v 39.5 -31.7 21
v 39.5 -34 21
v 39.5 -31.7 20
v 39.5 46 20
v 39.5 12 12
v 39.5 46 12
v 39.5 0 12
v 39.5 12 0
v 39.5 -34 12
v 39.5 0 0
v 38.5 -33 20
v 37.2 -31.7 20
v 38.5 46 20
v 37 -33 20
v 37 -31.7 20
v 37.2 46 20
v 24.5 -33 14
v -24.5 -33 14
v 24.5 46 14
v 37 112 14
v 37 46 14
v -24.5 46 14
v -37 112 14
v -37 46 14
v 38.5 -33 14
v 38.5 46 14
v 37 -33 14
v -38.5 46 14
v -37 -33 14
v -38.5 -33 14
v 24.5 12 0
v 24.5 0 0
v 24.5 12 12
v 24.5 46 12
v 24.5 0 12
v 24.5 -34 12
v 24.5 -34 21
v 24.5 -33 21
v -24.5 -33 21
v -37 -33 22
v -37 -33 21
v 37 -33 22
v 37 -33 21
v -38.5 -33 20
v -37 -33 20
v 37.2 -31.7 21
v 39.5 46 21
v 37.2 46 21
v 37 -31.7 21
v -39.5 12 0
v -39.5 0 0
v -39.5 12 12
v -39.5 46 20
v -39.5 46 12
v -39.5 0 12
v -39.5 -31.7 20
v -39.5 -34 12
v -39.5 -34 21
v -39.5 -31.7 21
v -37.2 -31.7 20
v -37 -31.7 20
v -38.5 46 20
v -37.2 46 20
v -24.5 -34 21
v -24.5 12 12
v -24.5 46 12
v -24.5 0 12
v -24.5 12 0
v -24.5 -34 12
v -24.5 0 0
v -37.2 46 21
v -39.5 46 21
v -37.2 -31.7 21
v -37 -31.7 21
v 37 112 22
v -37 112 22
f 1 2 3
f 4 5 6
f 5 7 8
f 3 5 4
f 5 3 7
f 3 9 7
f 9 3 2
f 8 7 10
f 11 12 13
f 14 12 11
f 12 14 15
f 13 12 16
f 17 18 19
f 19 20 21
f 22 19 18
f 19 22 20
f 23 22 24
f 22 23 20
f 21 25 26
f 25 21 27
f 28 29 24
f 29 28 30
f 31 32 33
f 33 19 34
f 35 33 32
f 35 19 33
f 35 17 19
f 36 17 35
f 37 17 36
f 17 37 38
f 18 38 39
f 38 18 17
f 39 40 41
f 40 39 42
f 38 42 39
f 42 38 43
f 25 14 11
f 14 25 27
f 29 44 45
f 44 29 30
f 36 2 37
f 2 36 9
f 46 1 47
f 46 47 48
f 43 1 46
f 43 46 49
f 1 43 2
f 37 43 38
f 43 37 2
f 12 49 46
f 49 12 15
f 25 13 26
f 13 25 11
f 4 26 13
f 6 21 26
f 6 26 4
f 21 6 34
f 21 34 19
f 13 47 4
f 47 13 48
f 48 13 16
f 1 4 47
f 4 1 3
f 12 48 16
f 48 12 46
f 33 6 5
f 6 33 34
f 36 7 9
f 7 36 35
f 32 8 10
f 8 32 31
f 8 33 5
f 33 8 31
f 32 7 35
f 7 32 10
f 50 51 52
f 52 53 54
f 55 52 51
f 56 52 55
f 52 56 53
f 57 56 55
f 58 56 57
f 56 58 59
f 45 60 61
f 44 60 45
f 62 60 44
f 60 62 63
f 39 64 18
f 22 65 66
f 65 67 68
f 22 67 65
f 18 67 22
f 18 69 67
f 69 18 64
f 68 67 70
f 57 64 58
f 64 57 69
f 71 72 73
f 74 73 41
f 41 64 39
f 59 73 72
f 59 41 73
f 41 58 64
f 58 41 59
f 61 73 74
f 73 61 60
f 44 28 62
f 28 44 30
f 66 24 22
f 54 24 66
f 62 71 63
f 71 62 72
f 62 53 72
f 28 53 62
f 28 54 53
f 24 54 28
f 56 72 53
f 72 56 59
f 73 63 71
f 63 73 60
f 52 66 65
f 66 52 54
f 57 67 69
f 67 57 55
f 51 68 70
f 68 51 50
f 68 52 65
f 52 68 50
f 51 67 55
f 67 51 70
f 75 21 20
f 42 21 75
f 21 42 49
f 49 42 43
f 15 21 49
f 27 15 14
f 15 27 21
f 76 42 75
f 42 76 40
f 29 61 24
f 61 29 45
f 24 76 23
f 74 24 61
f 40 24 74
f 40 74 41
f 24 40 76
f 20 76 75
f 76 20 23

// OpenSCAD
// file: ../parts/clip.scad
module clip() {
  nutX = 15;
  nutY = 12;
  nutZ = 12;
  cube([nutX, nutY, nutZ]);

  module corner(xyz) { 
    lip = 1.3;
    height = 6;
    x1 = xyz[0];
    y1 = 1;

    translate([0,0,xyz[2]]) {
      cube([x1, y1, height]); 
      translate([0, 0, height]) {
        cube([x1, y1+lip, 1]);
      }
    }

    x2 = 1;
    y2 = xyz[1];

    translate([xyz[0]-x2, 0, xyz[2]]) {
      cube([x2, y2, height]);
      translate([-lip,0,height]) {
        cube([x2+lip, y2, 1]);
      }
    }
  };

  module cubeWithCorner(xyz) {
    cube(xyz);
    corner(xyz);
  }

  ySup = 80;
  translate([0, -ySup/2 + nutY/2, nutZ]){
    cubeWithCorner([15, ySup, 2]);
  }
}

clip();
// file: ../vitamins/phone.scad
module phone() {
  color("grey") cube([74, 145, 8], center=true);
}
// file: clamp.scad
use<../parts/clip.scad>;

spread = 49;

translate([spread/2,0,0]) clip();
mirror([1,0,0]){
  translate([spread/2, 0,0]) clip();
}
// main file
include<./clamp.scad>;

use<../vitamins/phone.scad>;
translate([0, 39.5, 18]) phone();
